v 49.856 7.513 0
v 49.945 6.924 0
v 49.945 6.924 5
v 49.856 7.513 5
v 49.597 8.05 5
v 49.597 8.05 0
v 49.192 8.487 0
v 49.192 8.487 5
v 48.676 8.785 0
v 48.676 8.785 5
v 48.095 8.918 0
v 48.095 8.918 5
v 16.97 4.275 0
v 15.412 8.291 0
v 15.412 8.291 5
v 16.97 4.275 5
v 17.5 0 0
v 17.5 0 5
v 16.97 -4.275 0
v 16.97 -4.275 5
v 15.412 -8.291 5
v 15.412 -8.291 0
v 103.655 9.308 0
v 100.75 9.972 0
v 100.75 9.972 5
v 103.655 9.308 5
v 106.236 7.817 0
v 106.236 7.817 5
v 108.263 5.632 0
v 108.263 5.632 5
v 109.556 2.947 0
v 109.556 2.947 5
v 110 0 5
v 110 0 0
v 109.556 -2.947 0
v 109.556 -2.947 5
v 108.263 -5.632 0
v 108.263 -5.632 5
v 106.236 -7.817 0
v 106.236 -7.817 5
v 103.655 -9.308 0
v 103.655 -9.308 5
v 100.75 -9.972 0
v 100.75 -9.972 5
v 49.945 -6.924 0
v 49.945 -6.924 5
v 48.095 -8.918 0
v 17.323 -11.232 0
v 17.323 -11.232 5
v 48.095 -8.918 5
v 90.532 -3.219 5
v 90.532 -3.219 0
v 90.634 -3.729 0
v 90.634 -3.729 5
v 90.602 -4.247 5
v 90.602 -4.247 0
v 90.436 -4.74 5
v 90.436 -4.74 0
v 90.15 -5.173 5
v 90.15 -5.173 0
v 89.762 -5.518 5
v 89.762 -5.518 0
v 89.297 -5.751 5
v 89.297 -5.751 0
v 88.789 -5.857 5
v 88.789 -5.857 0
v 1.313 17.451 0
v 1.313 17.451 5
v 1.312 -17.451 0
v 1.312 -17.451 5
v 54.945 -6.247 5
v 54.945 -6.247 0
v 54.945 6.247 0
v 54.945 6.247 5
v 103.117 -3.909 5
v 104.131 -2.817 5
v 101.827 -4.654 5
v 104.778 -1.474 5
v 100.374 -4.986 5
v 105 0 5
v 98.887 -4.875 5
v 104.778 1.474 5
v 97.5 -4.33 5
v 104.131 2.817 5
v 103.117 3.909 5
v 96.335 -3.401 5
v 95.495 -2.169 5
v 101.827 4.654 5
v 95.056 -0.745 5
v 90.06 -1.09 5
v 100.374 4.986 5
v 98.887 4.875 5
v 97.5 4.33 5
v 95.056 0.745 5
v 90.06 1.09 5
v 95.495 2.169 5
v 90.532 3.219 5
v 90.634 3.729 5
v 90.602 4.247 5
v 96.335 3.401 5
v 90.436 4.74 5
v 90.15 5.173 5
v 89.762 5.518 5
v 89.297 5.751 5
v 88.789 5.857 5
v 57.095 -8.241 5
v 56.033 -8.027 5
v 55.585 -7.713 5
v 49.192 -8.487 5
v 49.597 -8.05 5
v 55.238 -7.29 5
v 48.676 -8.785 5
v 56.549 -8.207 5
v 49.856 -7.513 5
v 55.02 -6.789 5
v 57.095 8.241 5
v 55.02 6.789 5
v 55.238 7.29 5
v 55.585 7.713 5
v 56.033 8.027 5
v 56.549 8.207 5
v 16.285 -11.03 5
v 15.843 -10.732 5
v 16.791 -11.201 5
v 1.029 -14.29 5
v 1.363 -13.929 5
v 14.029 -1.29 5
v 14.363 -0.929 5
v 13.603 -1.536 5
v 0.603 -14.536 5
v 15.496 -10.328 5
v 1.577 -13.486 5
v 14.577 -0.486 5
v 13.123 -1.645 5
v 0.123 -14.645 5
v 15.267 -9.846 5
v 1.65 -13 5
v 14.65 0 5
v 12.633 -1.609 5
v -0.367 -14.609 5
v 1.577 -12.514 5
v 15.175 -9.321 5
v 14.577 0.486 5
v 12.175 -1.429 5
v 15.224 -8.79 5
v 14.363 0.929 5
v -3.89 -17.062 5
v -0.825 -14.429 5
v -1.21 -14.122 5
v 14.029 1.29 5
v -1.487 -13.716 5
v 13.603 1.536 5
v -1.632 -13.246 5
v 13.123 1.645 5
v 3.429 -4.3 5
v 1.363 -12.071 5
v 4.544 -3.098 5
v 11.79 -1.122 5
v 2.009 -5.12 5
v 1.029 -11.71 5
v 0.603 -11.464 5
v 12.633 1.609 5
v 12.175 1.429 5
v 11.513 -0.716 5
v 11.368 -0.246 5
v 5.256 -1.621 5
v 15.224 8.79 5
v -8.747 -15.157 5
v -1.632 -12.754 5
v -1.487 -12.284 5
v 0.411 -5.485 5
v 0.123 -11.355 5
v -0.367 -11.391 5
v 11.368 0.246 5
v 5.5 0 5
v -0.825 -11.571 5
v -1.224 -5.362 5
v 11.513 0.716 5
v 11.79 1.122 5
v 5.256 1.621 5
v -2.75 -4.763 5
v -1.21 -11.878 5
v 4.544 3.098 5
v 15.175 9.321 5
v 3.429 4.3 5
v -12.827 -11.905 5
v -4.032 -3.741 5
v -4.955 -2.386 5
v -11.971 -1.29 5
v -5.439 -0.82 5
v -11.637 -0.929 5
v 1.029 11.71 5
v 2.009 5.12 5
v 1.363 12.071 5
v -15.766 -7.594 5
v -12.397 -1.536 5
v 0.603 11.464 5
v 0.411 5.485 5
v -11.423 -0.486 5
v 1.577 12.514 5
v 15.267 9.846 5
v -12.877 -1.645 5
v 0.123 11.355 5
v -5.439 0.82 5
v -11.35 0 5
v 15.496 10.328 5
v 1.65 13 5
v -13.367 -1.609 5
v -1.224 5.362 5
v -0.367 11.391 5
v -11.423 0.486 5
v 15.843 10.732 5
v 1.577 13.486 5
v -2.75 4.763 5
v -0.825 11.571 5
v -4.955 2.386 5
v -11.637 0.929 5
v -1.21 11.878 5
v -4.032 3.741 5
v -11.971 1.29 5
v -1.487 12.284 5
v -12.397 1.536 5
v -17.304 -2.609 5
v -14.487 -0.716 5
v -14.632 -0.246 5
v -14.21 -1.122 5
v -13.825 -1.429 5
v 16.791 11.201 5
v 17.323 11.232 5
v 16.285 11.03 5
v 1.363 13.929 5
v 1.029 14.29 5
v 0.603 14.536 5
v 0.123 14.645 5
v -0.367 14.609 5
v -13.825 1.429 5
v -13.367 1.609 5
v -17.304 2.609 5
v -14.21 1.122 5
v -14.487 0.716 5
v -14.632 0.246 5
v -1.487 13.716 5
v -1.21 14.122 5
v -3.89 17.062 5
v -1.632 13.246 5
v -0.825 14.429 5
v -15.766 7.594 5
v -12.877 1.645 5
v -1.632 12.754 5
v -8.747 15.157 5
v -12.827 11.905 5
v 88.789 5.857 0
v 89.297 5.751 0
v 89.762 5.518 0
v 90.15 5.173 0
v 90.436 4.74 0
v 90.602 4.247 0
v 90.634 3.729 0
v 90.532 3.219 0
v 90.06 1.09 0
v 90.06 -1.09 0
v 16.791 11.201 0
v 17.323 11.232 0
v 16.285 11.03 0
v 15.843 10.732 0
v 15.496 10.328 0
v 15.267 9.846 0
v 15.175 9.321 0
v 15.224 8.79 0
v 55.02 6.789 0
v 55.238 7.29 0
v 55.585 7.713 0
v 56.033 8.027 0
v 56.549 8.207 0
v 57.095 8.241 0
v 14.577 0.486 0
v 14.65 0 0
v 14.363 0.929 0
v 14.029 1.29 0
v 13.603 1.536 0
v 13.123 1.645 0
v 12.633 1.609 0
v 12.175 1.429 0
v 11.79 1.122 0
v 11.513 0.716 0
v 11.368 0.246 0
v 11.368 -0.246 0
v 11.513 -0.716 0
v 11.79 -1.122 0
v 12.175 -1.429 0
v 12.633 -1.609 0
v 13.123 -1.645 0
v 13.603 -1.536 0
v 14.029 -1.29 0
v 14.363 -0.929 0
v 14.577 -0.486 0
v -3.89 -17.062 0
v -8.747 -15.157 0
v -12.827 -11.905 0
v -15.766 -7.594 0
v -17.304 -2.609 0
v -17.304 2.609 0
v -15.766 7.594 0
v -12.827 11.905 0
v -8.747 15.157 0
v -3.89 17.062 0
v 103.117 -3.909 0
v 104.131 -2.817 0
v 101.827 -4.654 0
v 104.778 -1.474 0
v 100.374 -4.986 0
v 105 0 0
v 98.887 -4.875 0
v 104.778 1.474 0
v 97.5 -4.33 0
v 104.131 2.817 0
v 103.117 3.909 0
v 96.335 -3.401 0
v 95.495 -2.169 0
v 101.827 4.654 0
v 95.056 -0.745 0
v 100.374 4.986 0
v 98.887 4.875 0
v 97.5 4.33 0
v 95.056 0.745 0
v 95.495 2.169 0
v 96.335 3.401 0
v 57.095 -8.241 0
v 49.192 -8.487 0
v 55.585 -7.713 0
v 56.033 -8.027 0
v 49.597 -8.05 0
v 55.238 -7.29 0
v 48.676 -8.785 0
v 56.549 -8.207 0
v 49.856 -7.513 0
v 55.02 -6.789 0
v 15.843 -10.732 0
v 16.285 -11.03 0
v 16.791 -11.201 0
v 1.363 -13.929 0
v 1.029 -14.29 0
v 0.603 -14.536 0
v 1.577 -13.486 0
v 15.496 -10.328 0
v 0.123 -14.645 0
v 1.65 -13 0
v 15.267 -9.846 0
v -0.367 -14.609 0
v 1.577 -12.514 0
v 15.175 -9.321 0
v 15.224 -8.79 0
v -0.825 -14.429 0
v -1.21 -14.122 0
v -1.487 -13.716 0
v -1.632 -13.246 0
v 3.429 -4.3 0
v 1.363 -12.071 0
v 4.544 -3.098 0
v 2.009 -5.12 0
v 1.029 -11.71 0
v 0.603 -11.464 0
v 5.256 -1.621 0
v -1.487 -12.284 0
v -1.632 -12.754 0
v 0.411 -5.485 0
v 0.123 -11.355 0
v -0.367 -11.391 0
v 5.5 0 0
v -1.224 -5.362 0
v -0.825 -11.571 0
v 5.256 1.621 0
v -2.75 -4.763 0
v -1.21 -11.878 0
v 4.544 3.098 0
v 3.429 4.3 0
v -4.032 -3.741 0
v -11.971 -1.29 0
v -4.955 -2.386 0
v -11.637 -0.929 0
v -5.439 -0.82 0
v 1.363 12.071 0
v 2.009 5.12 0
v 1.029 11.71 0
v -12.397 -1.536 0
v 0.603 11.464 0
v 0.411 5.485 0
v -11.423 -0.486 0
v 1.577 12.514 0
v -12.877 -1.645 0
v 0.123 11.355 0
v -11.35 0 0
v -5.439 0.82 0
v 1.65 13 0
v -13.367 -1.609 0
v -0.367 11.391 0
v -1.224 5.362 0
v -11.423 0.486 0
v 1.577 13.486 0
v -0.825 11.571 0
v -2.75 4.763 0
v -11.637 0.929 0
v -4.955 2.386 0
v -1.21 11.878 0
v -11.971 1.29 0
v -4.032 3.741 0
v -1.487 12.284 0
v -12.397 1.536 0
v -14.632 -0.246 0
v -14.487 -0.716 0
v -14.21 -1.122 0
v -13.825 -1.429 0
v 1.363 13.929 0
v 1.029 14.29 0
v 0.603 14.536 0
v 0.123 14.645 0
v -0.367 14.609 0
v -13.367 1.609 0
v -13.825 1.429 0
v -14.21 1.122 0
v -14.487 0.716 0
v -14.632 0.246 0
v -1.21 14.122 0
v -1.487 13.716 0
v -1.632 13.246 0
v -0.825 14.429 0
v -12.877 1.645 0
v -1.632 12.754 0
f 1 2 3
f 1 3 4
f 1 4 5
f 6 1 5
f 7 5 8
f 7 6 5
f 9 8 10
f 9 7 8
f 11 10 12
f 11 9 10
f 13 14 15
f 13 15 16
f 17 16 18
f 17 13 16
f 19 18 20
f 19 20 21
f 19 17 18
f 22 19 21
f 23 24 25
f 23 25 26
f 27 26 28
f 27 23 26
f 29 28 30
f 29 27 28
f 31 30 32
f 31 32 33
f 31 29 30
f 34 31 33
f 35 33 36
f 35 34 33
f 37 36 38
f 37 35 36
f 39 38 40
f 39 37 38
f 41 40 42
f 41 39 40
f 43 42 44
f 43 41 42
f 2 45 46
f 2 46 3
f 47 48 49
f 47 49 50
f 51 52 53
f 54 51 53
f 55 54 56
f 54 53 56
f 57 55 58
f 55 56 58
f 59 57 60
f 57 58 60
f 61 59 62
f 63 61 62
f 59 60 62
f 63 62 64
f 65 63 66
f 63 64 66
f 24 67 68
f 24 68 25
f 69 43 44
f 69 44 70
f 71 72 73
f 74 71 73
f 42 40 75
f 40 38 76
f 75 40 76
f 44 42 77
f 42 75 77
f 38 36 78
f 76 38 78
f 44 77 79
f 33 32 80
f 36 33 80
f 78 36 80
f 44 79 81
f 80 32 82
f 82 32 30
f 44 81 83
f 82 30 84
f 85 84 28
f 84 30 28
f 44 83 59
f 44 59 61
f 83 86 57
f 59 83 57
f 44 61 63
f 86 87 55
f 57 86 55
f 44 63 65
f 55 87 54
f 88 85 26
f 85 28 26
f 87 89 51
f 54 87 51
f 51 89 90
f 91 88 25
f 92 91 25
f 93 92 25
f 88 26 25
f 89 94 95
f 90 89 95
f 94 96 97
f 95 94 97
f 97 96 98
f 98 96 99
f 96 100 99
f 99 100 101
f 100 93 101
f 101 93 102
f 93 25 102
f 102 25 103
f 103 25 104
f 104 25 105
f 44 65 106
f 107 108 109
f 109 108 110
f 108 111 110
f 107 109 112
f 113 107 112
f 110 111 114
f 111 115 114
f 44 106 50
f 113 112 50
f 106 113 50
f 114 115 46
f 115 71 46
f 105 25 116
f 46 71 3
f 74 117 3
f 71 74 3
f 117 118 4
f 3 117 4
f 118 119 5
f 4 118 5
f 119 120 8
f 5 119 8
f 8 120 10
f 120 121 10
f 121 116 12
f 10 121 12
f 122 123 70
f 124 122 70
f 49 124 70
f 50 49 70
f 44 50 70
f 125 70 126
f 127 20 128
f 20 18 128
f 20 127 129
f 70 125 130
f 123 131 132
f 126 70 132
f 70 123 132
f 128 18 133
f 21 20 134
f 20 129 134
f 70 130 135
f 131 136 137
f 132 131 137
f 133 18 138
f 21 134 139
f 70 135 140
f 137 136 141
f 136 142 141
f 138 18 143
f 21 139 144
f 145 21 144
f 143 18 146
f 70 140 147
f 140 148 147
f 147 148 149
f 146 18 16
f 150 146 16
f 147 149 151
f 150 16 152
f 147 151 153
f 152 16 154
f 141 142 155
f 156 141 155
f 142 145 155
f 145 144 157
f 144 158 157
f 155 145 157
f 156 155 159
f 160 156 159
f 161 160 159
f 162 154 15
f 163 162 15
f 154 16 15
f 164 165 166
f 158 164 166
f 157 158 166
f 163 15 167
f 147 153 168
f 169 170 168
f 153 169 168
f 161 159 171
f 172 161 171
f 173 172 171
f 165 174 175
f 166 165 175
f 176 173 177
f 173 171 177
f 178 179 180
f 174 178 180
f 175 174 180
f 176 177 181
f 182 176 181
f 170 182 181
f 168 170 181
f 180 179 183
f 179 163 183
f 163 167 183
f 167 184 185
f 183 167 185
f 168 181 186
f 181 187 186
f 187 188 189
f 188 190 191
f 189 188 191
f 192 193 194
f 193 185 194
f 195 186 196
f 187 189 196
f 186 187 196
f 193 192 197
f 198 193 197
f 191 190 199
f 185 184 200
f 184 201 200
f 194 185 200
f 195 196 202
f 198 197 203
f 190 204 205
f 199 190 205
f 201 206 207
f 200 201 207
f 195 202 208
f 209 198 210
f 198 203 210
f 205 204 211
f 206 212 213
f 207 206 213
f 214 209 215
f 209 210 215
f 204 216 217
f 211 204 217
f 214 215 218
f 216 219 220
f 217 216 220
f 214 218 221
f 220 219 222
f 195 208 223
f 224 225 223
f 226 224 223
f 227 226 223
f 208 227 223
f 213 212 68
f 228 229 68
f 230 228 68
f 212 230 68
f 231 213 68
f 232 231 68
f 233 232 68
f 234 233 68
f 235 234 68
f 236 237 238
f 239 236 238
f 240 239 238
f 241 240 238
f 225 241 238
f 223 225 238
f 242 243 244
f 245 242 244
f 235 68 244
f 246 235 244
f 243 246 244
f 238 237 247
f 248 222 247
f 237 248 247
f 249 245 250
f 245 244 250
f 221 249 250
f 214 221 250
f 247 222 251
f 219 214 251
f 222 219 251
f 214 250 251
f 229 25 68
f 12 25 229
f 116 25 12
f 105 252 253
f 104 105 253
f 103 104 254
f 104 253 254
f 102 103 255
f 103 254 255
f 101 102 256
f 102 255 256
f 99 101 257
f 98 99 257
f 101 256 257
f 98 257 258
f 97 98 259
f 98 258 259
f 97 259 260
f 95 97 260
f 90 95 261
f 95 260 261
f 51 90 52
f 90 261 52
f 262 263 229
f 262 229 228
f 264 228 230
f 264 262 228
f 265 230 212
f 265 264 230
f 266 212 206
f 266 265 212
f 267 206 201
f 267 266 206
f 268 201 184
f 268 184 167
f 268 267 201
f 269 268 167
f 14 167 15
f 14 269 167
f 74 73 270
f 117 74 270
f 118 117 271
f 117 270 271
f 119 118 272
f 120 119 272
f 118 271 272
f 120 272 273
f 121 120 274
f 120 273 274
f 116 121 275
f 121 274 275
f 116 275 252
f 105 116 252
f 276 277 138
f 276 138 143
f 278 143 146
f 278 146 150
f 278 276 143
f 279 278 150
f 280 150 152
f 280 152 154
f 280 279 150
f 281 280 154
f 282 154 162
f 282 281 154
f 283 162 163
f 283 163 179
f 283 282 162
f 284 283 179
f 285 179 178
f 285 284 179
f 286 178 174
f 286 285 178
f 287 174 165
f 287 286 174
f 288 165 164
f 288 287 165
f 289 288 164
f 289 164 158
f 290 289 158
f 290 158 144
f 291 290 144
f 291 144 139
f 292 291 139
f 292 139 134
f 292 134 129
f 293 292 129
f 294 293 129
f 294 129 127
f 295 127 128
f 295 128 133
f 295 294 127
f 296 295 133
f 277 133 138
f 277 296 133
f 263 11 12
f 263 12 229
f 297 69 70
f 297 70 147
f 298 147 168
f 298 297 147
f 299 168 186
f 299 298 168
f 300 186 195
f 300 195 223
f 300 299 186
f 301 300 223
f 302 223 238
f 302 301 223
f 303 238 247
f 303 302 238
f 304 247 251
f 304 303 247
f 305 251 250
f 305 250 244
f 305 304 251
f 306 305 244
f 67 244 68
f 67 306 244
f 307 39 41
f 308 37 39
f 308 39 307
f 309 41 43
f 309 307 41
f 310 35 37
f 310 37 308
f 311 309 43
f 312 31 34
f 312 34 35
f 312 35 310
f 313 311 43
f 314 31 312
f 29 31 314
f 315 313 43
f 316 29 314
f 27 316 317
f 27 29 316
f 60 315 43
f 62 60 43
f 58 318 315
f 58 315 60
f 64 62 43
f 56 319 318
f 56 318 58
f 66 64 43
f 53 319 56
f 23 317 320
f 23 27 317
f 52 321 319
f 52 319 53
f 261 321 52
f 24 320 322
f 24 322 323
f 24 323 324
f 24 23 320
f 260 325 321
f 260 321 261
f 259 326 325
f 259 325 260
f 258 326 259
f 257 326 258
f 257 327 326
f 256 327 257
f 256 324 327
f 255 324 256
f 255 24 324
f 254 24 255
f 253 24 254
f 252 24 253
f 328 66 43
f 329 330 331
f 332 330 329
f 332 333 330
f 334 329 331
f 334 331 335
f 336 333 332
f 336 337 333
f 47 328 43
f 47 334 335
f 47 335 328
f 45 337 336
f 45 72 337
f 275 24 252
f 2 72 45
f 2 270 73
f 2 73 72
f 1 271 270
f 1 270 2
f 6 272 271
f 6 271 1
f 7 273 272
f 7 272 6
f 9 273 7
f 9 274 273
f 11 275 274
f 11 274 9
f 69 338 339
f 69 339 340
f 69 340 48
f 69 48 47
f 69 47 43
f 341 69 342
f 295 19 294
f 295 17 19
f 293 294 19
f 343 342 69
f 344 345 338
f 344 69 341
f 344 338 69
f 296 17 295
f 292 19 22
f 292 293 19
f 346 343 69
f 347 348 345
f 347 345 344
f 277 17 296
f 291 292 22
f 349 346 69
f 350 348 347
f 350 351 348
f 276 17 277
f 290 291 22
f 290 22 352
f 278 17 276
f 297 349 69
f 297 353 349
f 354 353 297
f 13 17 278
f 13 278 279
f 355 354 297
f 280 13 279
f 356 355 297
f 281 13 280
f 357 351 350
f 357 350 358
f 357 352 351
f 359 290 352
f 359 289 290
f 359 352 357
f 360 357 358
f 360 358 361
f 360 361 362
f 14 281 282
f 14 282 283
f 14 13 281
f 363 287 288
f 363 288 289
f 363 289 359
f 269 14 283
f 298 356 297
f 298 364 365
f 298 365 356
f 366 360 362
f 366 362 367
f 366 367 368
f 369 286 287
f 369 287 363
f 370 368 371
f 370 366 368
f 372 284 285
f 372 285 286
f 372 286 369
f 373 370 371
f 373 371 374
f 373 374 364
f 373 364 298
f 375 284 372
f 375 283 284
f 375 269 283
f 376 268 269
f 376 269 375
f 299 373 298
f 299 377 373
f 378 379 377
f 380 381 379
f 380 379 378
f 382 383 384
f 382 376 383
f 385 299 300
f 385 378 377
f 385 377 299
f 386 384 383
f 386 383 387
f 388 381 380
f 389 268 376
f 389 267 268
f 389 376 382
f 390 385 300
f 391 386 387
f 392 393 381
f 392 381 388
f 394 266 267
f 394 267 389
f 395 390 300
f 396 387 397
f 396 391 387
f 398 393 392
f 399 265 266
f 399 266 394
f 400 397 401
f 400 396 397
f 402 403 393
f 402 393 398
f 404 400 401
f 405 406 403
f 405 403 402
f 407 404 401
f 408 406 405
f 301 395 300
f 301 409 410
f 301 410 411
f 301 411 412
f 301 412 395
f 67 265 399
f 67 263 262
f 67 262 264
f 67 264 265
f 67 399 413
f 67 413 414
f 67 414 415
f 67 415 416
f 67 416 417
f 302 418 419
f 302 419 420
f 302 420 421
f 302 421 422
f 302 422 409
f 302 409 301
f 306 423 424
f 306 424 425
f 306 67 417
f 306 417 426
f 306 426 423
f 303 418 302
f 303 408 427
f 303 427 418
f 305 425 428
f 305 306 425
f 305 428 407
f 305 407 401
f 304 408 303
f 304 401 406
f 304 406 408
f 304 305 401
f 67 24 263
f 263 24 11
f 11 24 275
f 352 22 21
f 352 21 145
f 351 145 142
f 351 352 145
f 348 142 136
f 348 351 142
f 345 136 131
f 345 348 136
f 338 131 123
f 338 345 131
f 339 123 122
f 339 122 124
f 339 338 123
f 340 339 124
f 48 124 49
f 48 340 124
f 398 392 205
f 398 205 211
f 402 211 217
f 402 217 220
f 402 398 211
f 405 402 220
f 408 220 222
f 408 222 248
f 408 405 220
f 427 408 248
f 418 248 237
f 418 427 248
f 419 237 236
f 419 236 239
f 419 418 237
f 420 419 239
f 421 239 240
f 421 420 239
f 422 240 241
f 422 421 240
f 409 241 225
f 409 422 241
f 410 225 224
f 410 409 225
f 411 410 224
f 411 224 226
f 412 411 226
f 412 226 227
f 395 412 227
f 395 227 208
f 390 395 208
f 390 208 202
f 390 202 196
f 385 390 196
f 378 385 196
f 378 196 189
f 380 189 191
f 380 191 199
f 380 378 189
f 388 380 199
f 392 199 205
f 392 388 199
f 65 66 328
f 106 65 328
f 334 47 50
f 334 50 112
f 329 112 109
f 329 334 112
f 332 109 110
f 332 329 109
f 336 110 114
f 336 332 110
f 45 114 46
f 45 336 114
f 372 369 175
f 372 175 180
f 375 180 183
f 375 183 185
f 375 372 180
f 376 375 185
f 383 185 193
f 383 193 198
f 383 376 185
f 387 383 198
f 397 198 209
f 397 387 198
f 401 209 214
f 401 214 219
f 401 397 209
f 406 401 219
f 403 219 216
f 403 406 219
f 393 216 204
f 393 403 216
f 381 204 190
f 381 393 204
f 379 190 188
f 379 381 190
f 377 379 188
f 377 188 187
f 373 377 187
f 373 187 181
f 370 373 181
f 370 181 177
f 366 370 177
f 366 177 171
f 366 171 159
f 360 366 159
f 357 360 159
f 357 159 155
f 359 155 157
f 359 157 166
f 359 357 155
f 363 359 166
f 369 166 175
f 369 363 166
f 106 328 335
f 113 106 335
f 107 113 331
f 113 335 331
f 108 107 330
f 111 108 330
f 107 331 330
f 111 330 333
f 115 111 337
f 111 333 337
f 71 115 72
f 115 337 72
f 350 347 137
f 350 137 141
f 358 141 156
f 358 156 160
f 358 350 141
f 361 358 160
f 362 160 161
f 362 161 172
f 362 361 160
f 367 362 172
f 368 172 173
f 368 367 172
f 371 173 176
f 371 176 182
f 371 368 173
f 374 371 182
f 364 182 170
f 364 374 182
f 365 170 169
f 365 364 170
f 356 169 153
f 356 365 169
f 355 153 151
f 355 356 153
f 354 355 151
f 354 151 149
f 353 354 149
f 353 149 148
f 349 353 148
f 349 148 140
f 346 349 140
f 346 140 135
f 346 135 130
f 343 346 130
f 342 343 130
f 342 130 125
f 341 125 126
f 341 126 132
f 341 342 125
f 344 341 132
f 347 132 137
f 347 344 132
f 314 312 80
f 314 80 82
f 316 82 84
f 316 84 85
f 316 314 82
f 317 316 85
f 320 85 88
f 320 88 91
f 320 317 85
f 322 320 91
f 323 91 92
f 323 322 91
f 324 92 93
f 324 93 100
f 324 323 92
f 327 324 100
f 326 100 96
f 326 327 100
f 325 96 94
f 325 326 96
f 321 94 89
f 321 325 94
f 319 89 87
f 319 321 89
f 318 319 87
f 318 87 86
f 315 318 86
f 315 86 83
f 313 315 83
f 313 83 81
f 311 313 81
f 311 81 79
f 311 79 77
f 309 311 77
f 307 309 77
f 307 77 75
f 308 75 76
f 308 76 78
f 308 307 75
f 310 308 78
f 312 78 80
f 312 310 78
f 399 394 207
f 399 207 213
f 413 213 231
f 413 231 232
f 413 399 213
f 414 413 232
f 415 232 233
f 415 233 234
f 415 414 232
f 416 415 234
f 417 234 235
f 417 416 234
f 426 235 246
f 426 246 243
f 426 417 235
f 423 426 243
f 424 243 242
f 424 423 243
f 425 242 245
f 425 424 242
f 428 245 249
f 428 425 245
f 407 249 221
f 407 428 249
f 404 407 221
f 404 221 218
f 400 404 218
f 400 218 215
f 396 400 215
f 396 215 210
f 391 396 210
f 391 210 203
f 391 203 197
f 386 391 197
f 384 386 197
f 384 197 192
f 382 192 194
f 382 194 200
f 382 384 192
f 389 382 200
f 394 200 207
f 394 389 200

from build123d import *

# Parameters (mm, degrees)
SKETCH_2_R      = 5.5
SKETCH_2_R_2    = 5
SKETCH_2_R_3    = 1.65
EXTRUDE_1_DEPTH = 5


with BuildPart() as part:
    # 草图2 → 凸台-拉伸1 (new body)
    with BuildSketch(Plane.XY):
        with BuildLine():
            Line((1.3125, 17.450711841), (100.75, 9.971835338))
            ThreePointArc((100.75, 9.971835338), (110, 0), (100.75, -9.971835338))
            Line((100.75, -9.971835338), (1.3125, -17.450711841))
            ThreePointArc((1.3125, -17.450711841), (-17.5, 0), (1.3125, 17.450711841))
        make_face()
        Circle(SKETCH_2_R, mode=Mode.SUBTRACT)
        with Locations((100, 0)):
            Circle(SKETCH_2_R_2, mode=Mode.SUBTRACT)
        with Locations((0, 13)):
            Circle(SKETCH_2_R_3, mode=Mode.SUBTRACT)
        with Locations((13, 0)):
            Circle(SKETCH_2_R_3, mode=Mode.SUBTRACT)
        with Locations((0, -13)):
            Circle(SKETCH_2_R_3, mode=Mode.SUBTRACT)
        with Locations((-13, 0)):
            Circle(SKETCH_2_R_3, mode=Mode.SUBTRACT)
        with BuildLine():
            Line((17.322897462, -11.232418418), (48.094795732, -8.918007587))
            ThreePointArc((48.094795732, -8.918007587), (49.411083562, -8.283787571), (49.944795732, -6.92364052))
            Line((49.944795732, -6.92364052), (49.944795732, 6.92364052))
            ThreePointArc((49.944795732, 6.92364052), (49.411083562, 8.283787571), (48.094795732, 8.918007587))
            Line((48.094795732, 8.918007587), (17.322897462, 11.232418418))
            ThreePointArc((17.322897462, 11.232418418), (15.495779502, 10.327673003), (15.411574646, 8.290558904))
            ThreePointArc((15.411574646, 8.290558904), (17.5, 0), (15.411574646, -8.290558904))
            ThreePointArc((15.411574646, -8.290558904), (15.495779502, -10.327673003), (17.322897462, -11.232418418))
        make_face(mode=Mode.SUBTRACT)
        with BuildLine():
            Line((57.094795732, 8.241101103), (88.788774342, 5.857338922))
            ThreePointArc((88.788774342, 5.857338922), (90.307315813, 4.965681861), (90.532311952, 3.219143212))
            ThreePointArc((90.532311952, 3.219143212), (90, 0), (90.532311952, -3.219143212))
            ThreePointArc((90.532311952, -3.219143212), (90.307315813, -4.965681861), (88.788774342, -5.857338922))
            Line((88.788774342, -5.857338922), (57.094795732, -8.241101103))
            ThreePointArc((57.094795732, -8.241101103), (55.584648681, -7.713021866), (54.944795732, -6.246734036))
            Line((54.944795732, -6.246734036), (54.944795732, 6.246734036))
            ThreePointArc((54.944795732, 6.246734036), (55.584648681, 7.713021866), (57.094795732, 8.241101103))
        make_face(mode=Mode.SUBTRACT)
    extrude(amount=EXTRUDE_1_DEPTH)


solid = part.part
